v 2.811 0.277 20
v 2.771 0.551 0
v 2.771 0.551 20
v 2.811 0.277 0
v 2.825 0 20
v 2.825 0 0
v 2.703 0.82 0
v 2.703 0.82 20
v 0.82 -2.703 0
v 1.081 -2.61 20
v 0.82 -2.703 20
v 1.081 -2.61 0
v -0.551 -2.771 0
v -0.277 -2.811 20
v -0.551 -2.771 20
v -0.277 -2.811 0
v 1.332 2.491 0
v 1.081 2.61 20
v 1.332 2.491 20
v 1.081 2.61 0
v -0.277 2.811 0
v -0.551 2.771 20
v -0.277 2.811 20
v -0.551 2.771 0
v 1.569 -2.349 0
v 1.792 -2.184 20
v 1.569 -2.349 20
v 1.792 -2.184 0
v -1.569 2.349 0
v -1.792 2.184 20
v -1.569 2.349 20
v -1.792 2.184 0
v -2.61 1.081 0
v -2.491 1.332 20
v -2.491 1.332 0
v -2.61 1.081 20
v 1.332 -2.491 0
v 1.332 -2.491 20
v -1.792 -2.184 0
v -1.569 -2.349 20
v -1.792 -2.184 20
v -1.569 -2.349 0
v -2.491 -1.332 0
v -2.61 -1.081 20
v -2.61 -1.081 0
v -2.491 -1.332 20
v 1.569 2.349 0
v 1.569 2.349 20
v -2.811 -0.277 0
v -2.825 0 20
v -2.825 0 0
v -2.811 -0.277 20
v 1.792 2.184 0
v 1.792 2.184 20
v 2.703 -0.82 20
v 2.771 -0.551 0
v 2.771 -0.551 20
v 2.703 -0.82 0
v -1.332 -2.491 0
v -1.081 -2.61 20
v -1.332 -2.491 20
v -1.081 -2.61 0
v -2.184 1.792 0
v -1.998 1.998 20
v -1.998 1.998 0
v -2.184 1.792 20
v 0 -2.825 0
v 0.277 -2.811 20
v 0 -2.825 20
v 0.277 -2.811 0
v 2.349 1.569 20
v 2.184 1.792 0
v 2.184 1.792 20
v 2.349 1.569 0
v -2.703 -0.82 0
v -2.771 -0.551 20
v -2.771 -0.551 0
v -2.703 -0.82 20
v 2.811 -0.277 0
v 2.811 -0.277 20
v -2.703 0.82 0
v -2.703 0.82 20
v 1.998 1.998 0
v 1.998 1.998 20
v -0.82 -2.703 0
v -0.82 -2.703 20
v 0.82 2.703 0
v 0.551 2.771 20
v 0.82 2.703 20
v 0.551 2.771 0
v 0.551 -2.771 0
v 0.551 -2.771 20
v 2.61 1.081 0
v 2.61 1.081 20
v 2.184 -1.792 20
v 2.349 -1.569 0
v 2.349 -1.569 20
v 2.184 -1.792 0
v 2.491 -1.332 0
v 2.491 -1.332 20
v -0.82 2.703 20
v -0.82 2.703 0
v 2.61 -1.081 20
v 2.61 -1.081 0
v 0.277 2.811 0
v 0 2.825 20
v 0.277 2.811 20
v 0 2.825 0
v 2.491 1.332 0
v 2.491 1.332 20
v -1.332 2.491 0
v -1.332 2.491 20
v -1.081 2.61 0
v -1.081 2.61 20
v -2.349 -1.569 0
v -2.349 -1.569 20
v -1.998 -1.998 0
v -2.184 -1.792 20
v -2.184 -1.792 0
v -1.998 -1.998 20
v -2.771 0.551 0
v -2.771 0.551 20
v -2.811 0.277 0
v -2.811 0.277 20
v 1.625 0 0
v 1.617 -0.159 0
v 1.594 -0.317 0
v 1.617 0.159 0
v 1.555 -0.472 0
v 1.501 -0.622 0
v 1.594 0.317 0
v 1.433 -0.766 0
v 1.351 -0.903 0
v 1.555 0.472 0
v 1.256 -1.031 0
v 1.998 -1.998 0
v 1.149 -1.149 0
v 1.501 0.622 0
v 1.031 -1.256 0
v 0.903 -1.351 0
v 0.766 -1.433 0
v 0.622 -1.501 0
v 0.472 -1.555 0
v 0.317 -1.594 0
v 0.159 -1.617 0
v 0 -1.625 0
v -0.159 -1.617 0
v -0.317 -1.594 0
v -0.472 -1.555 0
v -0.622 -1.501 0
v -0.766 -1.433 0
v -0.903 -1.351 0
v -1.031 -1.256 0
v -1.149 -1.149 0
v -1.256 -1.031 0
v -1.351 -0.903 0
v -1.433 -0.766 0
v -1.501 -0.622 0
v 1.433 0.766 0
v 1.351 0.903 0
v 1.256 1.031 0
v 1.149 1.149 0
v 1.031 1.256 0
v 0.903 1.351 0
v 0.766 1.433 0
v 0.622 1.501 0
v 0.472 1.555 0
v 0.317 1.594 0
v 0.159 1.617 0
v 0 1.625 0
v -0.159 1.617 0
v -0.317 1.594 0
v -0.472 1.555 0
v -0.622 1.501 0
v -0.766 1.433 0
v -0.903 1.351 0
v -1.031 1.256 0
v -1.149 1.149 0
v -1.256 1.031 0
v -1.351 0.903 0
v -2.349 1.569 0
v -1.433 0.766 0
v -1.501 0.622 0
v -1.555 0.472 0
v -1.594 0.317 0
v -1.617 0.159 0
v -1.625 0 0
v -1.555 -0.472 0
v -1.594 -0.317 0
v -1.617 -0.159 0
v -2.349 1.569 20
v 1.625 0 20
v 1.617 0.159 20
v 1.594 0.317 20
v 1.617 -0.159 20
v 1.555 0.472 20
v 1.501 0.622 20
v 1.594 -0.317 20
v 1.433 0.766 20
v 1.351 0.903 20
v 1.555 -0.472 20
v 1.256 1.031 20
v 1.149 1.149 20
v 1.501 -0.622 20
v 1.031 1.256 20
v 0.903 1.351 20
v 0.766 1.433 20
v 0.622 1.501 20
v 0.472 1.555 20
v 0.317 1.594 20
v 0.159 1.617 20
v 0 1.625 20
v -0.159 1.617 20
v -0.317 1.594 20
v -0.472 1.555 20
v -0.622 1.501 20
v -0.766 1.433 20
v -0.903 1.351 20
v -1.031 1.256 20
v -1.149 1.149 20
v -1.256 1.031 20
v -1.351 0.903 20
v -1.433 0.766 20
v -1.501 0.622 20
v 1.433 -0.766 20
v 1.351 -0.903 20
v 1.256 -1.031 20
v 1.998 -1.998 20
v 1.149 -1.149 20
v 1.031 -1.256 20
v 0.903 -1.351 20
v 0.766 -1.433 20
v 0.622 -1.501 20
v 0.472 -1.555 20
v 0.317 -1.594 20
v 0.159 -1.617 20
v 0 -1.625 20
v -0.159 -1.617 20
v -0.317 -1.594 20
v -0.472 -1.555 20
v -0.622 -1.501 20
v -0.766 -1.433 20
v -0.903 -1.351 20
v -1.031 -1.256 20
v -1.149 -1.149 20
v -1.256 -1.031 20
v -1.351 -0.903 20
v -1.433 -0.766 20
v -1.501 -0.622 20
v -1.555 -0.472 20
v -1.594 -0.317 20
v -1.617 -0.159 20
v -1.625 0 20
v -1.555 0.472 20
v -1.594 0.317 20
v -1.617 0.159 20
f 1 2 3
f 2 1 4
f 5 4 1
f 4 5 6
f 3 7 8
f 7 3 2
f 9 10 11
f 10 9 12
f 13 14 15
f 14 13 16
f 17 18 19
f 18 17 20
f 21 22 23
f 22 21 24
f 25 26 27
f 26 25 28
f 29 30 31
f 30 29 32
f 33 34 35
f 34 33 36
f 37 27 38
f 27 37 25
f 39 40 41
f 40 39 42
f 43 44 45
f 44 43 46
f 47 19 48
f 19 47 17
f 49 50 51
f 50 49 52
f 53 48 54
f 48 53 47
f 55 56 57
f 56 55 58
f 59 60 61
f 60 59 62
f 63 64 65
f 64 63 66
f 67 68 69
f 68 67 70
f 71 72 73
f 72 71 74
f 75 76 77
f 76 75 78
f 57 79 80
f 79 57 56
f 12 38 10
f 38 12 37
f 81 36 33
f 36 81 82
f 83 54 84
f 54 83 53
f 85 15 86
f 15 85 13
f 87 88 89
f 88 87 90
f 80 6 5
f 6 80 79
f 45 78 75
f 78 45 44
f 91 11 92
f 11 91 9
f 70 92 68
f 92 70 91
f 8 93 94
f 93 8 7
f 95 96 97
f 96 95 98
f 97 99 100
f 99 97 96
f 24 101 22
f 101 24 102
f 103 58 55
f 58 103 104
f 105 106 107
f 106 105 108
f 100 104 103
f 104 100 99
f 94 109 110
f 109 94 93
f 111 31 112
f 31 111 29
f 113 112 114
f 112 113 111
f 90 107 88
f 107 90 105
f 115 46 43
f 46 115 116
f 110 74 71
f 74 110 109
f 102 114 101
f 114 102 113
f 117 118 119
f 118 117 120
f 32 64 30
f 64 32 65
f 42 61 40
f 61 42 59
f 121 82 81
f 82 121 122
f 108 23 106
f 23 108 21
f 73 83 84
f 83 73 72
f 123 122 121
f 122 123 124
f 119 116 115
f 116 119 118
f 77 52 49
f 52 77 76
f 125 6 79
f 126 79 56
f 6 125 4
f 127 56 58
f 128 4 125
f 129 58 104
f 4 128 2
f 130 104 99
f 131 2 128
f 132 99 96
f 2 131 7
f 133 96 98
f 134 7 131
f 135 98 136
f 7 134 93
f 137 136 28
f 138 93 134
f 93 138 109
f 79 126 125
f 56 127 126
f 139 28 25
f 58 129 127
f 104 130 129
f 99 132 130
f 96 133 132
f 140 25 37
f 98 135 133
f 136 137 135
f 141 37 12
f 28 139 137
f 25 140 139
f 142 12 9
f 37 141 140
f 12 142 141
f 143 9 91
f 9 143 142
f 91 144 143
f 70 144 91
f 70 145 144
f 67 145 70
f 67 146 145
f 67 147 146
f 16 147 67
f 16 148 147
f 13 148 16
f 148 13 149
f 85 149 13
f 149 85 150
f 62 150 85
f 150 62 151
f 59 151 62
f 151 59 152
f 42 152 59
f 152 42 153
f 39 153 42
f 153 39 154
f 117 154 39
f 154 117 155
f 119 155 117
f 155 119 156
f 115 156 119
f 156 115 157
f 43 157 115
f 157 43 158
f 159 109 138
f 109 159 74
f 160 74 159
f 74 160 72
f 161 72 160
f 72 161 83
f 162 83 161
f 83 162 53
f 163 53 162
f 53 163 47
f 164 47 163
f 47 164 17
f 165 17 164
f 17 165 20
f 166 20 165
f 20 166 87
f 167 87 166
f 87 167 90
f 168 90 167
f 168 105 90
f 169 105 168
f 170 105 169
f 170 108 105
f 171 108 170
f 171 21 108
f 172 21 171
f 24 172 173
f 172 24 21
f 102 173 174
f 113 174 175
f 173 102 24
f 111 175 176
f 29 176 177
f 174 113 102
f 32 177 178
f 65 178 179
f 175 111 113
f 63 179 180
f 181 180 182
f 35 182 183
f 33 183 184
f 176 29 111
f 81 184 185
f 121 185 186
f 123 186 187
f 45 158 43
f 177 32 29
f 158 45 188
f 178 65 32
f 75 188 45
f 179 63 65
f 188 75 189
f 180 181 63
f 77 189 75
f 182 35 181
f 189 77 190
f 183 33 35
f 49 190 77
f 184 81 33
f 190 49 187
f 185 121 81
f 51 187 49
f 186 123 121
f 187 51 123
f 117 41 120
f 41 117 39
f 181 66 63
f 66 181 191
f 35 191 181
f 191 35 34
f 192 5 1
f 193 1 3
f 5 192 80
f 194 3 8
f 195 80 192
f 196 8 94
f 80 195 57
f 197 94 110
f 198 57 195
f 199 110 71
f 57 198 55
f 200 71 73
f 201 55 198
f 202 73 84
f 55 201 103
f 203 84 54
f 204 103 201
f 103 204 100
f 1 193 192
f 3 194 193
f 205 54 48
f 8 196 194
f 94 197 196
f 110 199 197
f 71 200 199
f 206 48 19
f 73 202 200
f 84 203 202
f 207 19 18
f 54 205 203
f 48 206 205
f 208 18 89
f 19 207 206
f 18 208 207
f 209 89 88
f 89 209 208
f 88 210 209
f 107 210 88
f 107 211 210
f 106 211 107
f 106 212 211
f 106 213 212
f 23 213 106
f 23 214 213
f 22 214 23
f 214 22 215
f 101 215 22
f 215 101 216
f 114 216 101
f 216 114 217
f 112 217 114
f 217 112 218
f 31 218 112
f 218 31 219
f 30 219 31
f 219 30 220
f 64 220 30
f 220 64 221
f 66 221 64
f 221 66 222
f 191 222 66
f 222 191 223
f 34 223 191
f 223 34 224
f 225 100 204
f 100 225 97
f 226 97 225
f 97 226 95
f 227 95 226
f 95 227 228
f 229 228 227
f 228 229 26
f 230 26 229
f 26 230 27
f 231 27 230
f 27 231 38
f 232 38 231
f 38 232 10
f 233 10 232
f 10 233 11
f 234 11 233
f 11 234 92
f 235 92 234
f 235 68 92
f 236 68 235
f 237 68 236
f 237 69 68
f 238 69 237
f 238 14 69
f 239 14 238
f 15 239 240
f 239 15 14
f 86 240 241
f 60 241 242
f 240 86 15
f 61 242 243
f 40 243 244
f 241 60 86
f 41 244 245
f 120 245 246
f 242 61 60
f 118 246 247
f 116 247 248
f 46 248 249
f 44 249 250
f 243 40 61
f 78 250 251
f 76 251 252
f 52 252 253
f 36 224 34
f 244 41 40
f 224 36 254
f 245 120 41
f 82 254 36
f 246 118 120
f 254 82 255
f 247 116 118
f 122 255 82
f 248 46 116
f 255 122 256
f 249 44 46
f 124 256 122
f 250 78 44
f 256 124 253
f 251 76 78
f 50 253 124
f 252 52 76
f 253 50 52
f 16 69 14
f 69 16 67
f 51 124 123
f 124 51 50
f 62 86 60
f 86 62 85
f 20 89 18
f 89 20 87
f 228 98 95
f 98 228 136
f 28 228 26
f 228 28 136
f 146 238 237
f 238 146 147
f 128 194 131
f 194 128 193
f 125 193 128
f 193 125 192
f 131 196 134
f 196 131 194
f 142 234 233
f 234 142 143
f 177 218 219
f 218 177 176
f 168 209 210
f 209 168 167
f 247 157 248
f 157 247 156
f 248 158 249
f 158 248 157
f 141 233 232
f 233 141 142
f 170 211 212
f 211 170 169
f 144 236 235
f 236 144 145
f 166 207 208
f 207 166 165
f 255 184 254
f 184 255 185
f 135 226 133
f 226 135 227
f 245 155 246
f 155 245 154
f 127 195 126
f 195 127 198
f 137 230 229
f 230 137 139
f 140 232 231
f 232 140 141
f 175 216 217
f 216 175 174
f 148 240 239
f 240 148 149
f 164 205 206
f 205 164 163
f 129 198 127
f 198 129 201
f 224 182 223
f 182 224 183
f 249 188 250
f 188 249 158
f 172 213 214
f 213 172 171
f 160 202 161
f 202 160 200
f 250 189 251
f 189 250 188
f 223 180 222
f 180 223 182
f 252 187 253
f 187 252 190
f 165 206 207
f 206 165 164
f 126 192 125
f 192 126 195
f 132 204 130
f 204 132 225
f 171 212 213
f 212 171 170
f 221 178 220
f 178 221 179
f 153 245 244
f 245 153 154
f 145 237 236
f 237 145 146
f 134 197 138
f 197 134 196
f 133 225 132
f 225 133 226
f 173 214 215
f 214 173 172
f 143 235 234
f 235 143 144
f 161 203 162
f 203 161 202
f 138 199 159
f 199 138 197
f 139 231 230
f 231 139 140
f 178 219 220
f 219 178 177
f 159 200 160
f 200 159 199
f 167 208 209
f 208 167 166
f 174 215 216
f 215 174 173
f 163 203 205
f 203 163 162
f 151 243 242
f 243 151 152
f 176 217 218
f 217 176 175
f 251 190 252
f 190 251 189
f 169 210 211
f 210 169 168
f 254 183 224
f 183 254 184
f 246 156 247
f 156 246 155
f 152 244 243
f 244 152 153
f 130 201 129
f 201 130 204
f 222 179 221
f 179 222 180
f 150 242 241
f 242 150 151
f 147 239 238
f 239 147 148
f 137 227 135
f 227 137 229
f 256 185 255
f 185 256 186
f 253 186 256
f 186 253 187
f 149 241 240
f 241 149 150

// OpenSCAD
sr=3.25/2;
tt=1.2;
th=20;

$fn=64;
difference() {
  cylinder(r=sr+tt,h=th);
  translate([0,0,-0.1]) cylinder(r=sr,h=th+0.2);
}
